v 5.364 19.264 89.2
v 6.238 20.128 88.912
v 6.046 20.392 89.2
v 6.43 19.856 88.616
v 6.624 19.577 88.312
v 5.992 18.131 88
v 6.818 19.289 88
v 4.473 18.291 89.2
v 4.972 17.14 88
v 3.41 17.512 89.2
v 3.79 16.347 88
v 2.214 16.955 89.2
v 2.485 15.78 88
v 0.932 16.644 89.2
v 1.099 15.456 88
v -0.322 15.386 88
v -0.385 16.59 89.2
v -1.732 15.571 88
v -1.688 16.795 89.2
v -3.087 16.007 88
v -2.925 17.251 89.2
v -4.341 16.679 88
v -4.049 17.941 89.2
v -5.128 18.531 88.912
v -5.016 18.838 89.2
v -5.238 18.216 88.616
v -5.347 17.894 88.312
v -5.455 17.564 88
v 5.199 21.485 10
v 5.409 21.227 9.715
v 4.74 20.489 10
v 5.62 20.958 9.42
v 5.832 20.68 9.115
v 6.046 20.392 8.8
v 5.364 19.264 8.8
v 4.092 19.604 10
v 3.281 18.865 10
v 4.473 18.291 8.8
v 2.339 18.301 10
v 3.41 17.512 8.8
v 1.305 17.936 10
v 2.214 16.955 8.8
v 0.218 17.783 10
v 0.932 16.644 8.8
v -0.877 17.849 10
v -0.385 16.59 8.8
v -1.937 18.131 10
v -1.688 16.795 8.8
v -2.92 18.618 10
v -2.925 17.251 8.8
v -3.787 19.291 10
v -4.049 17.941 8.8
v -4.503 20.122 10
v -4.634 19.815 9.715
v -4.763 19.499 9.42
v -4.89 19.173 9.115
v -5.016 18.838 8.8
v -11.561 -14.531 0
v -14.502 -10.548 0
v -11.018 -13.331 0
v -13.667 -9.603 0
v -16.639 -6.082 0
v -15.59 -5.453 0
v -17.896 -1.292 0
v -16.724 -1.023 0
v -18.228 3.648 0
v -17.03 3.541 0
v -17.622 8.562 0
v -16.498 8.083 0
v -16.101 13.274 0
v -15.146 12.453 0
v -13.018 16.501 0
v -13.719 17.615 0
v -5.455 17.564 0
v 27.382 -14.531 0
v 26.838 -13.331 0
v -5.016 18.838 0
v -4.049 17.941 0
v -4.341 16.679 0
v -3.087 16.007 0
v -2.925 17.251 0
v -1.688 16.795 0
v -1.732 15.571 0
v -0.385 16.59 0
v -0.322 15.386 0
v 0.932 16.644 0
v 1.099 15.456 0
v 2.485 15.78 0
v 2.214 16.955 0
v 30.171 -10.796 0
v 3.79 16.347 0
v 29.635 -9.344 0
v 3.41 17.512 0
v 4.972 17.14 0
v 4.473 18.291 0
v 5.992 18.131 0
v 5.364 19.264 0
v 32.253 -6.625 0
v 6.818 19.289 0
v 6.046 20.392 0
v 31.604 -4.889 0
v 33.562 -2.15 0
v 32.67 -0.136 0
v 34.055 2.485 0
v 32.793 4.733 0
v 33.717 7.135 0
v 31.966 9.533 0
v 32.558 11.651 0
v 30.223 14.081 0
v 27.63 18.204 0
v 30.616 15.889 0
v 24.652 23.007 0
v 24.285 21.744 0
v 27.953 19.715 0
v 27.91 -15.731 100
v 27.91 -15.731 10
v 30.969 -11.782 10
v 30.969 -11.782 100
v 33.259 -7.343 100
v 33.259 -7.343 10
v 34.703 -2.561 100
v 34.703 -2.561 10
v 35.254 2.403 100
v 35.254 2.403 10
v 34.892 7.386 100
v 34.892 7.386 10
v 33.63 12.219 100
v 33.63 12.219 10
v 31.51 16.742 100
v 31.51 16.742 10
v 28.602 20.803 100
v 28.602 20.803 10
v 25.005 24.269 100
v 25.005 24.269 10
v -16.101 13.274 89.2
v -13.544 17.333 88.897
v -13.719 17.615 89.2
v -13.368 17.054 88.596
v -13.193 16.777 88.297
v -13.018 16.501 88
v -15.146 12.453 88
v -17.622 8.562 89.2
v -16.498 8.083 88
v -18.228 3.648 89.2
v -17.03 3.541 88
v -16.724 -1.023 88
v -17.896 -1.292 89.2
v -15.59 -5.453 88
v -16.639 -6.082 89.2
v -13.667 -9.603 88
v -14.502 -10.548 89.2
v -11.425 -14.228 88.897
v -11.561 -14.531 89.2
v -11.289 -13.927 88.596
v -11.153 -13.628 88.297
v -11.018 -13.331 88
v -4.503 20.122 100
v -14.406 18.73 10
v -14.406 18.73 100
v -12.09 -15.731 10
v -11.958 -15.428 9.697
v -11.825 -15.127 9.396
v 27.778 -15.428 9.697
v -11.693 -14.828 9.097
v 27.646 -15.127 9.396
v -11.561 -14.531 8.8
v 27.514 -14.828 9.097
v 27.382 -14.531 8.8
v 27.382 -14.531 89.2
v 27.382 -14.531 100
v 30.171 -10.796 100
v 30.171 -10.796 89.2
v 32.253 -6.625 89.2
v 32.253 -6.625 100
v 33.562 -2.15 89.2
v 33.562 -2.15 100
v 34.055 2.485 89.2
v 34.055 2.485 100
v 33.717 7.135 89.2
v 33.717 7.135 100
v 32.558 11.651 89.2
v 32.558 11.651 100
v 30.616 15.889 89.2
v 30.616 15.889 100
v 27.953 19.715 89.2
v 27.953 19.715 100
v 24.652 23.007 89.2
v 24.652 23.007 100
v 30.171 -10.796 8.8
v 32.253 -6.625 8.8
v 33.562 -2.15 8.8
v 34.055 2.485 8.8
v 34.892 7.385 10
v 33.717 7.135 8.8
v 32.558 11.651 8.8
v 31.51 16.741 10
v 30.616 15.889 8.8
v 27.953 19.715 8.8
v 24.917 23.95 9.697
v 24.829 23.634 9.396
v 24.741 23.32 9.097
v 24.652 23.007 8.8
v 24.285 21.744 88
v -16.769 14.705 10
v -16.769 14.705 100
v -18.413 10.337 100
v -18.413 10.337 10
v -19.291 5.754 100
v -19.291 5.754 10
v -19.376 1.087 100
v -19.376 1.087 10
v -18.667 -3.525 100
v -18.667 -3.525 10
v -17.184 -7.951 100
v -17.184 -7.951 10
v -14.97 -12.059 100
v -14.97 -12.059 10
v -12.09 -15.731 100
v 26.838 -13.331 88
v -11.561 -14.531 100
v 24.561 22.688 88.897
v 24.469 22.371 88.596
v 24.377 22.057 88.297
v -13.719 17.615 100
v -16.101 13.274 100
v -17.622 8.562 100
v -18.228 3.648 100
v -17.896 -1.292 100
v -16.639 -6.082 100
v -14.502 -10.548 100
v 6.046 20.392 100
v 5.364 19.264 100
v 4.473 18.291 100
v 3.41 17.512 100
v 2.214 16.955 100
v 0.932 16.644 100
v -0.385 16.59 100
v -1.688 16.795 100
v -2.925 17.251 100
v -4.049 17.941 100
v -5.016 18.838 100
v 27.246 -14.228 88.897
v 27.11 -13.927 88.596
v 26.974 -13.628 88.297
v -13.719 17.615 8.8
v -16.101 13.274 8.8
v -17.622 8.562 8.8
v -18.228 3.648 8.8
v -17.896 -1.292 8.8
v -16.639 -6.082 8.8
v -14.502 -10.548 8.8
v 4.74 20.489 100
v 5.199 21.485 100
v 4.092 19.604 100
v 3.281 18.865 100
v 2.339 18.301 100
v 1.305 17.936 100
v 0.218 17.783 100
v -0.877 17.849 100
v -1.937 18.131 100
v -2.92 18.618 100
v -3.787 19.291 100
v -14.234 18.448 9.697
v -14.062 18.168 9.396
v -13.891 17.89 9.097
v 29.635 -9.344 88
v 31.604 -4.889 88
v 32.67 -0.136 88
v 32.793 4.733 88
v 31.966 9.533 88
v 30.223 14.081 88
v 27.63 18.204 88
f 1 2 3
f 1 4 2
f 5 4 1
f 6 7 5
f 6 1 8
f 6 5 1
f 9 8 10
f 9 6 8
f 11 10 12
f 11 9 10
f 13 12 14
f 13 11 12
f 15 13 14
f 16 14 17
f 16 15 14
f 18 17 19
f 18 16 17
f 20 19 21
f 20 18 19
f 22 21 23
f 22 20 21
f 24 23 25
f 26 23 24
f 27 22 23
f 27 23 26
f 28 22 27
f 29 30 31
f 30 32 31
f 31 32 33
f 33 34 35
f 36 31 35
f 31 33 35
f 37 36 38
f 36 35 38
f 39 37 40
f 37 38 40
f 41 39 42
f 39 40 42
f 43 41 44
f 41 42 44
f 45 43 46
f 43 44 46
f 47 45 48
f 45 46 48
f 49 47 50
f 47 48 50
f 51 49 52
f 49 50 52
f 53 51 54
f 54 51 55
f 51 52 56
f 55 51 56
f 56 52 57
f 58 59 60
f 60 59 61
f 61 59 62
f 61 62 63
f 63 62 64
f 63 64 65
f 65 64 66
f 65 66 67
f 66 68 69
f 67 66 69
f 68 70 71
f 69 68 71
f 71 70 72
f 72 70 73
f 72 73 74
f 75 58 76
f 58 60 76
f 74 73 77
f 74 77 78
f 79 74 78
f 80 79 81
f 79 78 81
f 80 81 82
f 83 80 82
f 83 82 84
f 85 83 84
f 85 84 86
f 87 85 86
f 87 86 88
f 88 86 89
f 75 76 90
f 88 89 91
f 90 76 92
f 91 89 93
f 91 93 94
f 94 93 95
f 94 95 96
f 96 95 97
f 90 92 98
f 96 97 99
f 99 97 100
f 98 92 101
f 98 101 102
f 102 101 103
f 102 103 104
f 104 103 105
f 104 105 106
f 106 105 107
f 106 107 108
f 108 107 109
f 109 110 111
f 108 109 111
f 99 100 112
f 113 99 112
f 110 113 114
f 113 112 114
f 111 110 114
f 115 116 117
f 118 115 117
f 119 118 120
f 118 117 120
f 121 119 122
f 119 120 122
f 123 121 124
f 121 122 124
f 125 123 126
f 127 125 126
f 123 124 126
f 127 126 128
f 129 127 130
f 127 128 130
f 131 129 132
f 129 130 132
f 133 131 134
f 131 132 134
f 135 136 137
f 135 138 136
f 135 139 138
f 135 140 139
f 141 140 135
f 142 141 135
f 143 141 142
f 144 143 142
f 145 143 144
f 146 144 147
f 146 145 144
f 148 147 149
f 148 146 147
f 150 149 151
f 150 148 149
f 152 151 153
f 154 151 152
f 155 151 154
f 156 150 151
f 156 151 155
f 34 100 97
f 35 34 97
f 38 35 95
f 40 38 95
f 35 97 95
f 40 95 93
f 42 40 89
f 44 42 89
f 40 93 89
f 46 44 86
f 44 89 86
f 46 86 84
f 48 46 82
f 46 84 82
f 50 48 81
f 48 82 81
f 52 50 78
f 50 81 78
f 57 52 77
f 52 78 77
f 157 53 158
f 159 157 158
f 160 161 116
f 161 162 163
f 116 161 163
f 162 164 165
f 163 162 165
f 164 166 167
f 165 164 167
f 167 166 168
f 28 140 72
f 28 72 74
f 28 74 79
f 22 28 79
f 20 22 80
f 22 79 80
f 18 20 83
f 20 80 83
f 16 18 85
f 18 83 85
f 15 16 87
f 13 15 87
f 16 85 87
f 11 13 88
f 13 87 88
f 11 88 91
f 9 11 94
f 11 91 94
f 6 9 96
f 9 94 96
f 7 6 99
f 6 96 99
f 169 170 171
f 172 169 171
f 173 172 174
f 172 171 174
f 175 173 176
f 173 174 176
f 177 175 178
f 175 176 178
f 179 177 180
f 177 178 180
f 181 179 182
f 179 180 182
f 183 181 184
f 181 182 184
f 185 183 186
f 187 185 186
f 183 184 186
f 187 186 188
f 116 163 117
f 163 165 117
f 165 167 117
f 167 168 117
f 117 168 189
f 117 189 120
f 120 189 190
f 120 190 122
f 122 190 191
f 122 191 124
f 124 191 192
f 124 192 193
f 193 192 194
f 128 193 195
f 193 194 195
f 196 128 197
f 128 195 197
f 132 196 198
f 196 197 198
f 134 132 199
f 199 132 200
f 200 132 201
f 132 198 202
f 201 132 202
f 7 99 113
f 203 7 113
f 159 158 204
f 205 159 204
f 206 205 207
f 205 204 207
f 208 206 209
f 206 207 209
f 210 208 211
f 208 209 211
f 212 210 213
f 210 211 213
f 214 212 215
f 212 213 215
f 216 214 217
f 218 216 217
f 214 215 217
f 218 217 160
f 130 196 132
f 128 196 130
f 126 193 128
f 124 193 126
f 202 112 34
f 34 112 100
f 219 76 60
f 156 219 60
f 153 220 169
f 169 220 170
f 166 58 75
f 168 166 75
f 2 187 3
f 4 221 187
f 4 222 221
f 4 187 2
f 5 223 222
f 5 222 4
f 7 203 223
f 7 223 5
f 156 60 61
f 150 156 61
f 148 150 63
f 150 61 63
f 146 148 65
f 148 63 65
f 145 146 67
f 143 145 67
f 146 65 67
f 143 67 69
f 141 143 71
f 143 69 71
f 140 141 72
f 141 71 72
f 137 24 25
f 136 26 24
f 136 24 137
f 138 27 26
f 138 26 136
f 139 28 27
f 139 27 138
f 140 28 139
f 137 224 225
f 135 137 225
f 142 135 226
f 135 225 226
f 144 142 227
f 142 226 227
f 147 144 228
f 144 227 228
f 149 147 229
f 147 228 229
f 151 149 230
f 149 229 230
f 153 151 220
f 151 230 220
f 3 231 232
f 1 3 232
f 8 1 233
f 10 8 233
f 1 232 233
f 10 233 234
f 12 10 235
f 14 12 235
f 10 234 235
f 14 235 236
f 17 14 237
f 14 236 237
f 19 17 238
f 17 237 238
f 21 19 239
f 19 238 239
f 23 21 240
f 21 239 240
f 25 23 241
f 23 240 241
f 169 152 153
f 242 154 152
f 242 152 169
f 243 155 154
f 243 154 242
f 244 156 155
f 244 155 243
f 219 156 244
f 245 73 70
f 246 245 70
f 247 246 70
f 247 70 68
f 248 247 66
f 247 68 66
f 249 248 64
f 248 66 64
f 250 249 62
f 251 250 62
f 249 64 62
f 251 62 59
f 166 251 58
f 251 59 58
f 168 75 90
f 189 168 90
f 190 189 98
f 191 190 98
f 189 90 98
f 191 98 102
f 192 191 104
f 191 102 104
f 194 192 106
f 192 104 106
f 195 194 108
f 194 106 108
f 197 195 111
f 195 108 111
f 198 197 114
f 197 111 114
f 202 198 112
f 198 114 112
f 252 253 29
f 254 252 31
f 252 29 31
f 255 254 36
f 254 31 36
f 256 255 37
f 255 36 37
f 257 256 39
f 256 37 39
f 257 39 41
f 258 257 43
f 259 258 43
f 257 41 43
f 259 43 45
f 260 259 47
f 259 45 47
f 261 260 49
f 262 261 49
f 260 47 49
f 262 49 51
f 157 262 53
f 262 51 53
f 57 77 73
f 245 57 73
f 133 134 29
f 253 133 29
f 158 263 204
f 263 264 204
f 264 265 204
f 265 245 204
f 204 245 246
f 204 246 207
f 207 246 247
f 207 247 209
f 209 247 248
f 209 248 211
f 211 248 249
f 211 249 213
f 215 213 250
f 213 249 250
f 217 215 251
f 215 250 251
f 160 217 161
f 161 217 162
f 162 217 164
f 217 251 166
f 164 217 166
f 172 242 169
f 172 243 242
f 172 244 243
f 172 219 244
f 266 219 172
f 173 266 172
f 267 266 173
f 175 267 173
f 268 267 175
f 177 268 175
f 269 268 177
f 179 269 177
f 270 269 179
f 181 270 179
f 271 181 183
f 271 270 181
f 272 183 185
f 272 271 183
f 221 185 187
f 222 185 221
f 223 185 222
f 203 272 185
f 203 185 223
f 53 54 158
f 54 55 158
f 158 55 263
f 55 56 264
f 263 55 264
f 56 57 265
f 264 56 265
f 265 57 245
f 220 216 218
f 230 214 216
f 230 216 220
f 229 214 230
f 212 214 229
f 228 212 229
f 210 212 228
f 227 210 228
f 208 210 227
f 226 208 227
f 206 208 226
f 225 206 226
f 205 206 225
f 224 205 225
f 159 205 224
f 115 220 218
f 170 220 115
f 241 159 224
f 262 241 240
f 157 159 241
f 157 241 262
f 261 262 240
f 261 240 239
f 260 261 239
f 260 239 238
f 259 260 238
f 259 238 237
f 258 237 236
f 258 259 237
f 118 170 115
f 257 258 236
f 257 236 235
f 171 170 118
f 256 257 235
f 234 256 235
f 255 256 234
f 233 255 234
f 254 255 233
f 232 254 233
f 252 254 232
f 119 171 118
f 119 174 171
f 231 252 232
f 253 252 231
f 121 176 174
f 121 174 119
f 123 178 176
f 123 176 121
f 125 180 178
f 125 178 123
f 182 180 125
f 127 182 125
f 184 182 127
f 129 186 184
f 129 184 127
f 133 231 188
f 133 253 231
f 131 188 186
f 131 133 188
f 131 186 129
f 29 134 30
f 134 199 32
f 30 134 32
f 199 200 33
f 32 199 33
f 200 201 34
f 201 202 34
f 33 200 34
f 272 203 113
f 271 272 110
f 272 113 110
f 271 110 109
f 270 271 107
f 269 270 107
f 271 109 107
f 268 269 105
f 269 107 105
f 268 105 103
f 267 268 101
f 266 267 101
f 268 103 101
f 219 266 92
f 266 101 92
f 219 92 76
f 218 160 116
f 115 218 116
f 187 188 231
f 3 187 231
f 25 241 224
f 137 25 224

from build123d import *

# Parameters (mm, degrees)
F1_DEPTH = 100
F3_DEPTH = 10
F5_DEPTH = 12
F6_SIZE  = 1.19999


# Not quite as in the source:
# - a fillet or chamfer is up to 0.001 mm smaller than in the source, because OpenCascade refuses the exact size


with BuildPart() as f1:
    # F0 (on Top) → F1 (new body)
    with BuildSketch(Plane.XY):
        with BuildLine():
            Line((-12.0897765349, -15.731314094), (27.9102234651, -15.731314094))
            ThreePointArc((27.9102234651, -15.731314094), (35.186552736, 4.9027765722), (25.0045970812, 24.268685906))
            Line((25.0045970812, 24.268685906), (5.1992357064, 21.4852238868))
            ThreePointArc((5.1992357064, 21.4852238868), (0.7654520553, 17.832613514), (-4.5033702016, 20.1216115537))
            Line((-4.5033702016, 20.1216115537), (-14.406050889, 18.7298805441))
            ThreePointArc((-14.406050889, 18.7298805441), (-19.3764079278, 1.0873626828), (-12.0897765349, -15.731314094))
        make_face()
        with BuildLine():
            ThreePointArc((-11.0175789214, -13.331314094), (-16.9820661814, 1.2521155975), (-13.0181733872, 16.5013478326))
            Line((-13.0181733872, 16.5013478326), (-5.4545185869, 17.5643501916))
            ThreePointArc((-5.4545185869, 17.5643501916), (1.0994674976, 15.455970149), (6.8184149763, 19.2891985189))
            Line((6.8184149763, 19.2891985189), (24.284750464, 21.7439318875))
            ThreePointArc((24.284750464, 21.7439318875), (32.7925833849, 4.7326981573), (26.8380258517, -13.331314094))
            Line((26.8380258517, -13.331314094), (-11.0175789214, -13.331314094))
        make_face(mode=Mode.SUBTRACT)
    extrude(amount=F1_DEPTH)

    # F2 (on face) → F3 (cut)
    with BuildSketch(Plane(origin=(0, 0, 0), x_dir=(1, 0, 0), z_dir=(0, 0, -1))):
        with BuildLine():
            Line((27.9102234651, 15.731314094), (-12.0897765349, 15.731314094))
            ThreePointArc((-12.0897765349, 15.731314094), (-19.3764079278, -1.0873626828), (-14.406050889, -18.7298805441))
            Line((-14.406050889, -18.7298805441), (-4.5033702016, -20.1216115537))
            ThreePointArc((-4.5033702016, -20.1216115537), (0.7654520553, -17.832613514), (5.1992357064, -21.4852238868))
            Line((5.1992357064, -21.4852238868), (25.0045970812, -24.268685906))
            ThreePointArc((25.0045970812, -24.268685906), (35.186552736, -4.9027765722), (27.9102234651, 15.731314094))
        make_face()
        with BuildLine():
            ThreePointArc((6.0462768814, -20.3924746735), (0.9324597764, -16.6442918315), (-5.0163959343, -18.837717402))
            Line((-5.0163959343, -18.837717402), (-13.7193495518, -17.6145970362))
            ThreePointArc((-13.7193495518, -17.6145970362), (-18.1792377522, -1.1697483945), (-11.5610592762, 14.531314094))
            Line((-11.5610592762, 14.531314094), (27.3815062065, 14.531314094))
            ThreePointArc((27.3815062065, 14.531314094), (33.9895674633, -4.8177466261), (24.6519111864, -23.0073260489))
            Line((24.6519111864, -23.0073260489), (6.0462768814, -20.3924746735))
        make_face(mode=Mode.SUBTRACT)
    extrude(amount=-F3_DEPTH, mode=Mode.SUBTRACT)

    # F4 (on face) → F5 (cut)
    with BuildSketch(Plane.XY.offset(100)):
        with BuildLine():
            Line((-5.0163959343, 18.837717402), (-13.7193495518, 17.6145970362))
            ThreePointArc((-13.7193495518, 17.6145970362), (-18.1792377522, 1.1697483945), (-11.5610592762, -14.531314094))
            Line((-11.5610592762, -14.531314094), (27.3815062065, -14.531314094))
            ThreePointArc((27.3815062065, -14.531314094), (33.9895674633, 4.8177466261), (24.6519111864, 23.0073260489))
            Line((24.6519111864, 23.0073260489), (6.0462768814, 20.3924746735))
            ThreePointArc((6.0462768814, 20.3924746735), (0.9324597764, 16.6442918315), (-5.0163959343, 18.837717402))
        make_face()
        with BuildLine():
            ThreePointArc((24.284750464, 21.7439318875), (32.7925833849, 4.7326981573), (26.8380258517, -13.331314094))
            Line((26.8380258517, -13.331314094), (-11.0175789214, -13.331314094))
            ThreePointArc((-11.0175789214, -13.331314094), (-16.9820661814, 1.2521155975), (-13.0181733872, 16.5013478326))
            Line((-13.0181733872, 16.5013478326), (-5.4545185869, 17.5643501916))
            ThreePointArc((-5.4545185869, 17.5643501916), (1.0994674976, 15.455970149), (6.8184149763, 19.2891985189))
            Line((6.8184149763, 19.2891985189), (24.284750464, 21.7439318875))
        make_face(mode=Mode.SUBTRACT)
    extrude(amount=-F5_DEPTH, mode=Mode.SUBTRACT)

    # F6 (size 1.2 in the source; OpenCascade refuses exactly that, so slightly less here)
    f6_edges = [f1.edges().sort_by_distance(p)[0] for p in [
        (15.349094, 21.6999, 10),
        (33.989567, 4.817747, 10),
        (0.93246, 16.644292, 10),
        (-9.367873, 18.226157, 10),
        (-18.179238, 1.169748, 10),
        (7.910223, -14.531314, 10),
        (-18.179238, 1.169748, 88),
        (-9.367873, 18.226157, 88),
        (0.93246, 16.644292, 88),
        (15.349094, 21.6999, 88),
        (7.910223, -14.531314, 88),
        (33.989567, 4.817747, 88),
    ]]
    chamfer(f6_edges, length=F6_SIZE)


solid = f1.part
